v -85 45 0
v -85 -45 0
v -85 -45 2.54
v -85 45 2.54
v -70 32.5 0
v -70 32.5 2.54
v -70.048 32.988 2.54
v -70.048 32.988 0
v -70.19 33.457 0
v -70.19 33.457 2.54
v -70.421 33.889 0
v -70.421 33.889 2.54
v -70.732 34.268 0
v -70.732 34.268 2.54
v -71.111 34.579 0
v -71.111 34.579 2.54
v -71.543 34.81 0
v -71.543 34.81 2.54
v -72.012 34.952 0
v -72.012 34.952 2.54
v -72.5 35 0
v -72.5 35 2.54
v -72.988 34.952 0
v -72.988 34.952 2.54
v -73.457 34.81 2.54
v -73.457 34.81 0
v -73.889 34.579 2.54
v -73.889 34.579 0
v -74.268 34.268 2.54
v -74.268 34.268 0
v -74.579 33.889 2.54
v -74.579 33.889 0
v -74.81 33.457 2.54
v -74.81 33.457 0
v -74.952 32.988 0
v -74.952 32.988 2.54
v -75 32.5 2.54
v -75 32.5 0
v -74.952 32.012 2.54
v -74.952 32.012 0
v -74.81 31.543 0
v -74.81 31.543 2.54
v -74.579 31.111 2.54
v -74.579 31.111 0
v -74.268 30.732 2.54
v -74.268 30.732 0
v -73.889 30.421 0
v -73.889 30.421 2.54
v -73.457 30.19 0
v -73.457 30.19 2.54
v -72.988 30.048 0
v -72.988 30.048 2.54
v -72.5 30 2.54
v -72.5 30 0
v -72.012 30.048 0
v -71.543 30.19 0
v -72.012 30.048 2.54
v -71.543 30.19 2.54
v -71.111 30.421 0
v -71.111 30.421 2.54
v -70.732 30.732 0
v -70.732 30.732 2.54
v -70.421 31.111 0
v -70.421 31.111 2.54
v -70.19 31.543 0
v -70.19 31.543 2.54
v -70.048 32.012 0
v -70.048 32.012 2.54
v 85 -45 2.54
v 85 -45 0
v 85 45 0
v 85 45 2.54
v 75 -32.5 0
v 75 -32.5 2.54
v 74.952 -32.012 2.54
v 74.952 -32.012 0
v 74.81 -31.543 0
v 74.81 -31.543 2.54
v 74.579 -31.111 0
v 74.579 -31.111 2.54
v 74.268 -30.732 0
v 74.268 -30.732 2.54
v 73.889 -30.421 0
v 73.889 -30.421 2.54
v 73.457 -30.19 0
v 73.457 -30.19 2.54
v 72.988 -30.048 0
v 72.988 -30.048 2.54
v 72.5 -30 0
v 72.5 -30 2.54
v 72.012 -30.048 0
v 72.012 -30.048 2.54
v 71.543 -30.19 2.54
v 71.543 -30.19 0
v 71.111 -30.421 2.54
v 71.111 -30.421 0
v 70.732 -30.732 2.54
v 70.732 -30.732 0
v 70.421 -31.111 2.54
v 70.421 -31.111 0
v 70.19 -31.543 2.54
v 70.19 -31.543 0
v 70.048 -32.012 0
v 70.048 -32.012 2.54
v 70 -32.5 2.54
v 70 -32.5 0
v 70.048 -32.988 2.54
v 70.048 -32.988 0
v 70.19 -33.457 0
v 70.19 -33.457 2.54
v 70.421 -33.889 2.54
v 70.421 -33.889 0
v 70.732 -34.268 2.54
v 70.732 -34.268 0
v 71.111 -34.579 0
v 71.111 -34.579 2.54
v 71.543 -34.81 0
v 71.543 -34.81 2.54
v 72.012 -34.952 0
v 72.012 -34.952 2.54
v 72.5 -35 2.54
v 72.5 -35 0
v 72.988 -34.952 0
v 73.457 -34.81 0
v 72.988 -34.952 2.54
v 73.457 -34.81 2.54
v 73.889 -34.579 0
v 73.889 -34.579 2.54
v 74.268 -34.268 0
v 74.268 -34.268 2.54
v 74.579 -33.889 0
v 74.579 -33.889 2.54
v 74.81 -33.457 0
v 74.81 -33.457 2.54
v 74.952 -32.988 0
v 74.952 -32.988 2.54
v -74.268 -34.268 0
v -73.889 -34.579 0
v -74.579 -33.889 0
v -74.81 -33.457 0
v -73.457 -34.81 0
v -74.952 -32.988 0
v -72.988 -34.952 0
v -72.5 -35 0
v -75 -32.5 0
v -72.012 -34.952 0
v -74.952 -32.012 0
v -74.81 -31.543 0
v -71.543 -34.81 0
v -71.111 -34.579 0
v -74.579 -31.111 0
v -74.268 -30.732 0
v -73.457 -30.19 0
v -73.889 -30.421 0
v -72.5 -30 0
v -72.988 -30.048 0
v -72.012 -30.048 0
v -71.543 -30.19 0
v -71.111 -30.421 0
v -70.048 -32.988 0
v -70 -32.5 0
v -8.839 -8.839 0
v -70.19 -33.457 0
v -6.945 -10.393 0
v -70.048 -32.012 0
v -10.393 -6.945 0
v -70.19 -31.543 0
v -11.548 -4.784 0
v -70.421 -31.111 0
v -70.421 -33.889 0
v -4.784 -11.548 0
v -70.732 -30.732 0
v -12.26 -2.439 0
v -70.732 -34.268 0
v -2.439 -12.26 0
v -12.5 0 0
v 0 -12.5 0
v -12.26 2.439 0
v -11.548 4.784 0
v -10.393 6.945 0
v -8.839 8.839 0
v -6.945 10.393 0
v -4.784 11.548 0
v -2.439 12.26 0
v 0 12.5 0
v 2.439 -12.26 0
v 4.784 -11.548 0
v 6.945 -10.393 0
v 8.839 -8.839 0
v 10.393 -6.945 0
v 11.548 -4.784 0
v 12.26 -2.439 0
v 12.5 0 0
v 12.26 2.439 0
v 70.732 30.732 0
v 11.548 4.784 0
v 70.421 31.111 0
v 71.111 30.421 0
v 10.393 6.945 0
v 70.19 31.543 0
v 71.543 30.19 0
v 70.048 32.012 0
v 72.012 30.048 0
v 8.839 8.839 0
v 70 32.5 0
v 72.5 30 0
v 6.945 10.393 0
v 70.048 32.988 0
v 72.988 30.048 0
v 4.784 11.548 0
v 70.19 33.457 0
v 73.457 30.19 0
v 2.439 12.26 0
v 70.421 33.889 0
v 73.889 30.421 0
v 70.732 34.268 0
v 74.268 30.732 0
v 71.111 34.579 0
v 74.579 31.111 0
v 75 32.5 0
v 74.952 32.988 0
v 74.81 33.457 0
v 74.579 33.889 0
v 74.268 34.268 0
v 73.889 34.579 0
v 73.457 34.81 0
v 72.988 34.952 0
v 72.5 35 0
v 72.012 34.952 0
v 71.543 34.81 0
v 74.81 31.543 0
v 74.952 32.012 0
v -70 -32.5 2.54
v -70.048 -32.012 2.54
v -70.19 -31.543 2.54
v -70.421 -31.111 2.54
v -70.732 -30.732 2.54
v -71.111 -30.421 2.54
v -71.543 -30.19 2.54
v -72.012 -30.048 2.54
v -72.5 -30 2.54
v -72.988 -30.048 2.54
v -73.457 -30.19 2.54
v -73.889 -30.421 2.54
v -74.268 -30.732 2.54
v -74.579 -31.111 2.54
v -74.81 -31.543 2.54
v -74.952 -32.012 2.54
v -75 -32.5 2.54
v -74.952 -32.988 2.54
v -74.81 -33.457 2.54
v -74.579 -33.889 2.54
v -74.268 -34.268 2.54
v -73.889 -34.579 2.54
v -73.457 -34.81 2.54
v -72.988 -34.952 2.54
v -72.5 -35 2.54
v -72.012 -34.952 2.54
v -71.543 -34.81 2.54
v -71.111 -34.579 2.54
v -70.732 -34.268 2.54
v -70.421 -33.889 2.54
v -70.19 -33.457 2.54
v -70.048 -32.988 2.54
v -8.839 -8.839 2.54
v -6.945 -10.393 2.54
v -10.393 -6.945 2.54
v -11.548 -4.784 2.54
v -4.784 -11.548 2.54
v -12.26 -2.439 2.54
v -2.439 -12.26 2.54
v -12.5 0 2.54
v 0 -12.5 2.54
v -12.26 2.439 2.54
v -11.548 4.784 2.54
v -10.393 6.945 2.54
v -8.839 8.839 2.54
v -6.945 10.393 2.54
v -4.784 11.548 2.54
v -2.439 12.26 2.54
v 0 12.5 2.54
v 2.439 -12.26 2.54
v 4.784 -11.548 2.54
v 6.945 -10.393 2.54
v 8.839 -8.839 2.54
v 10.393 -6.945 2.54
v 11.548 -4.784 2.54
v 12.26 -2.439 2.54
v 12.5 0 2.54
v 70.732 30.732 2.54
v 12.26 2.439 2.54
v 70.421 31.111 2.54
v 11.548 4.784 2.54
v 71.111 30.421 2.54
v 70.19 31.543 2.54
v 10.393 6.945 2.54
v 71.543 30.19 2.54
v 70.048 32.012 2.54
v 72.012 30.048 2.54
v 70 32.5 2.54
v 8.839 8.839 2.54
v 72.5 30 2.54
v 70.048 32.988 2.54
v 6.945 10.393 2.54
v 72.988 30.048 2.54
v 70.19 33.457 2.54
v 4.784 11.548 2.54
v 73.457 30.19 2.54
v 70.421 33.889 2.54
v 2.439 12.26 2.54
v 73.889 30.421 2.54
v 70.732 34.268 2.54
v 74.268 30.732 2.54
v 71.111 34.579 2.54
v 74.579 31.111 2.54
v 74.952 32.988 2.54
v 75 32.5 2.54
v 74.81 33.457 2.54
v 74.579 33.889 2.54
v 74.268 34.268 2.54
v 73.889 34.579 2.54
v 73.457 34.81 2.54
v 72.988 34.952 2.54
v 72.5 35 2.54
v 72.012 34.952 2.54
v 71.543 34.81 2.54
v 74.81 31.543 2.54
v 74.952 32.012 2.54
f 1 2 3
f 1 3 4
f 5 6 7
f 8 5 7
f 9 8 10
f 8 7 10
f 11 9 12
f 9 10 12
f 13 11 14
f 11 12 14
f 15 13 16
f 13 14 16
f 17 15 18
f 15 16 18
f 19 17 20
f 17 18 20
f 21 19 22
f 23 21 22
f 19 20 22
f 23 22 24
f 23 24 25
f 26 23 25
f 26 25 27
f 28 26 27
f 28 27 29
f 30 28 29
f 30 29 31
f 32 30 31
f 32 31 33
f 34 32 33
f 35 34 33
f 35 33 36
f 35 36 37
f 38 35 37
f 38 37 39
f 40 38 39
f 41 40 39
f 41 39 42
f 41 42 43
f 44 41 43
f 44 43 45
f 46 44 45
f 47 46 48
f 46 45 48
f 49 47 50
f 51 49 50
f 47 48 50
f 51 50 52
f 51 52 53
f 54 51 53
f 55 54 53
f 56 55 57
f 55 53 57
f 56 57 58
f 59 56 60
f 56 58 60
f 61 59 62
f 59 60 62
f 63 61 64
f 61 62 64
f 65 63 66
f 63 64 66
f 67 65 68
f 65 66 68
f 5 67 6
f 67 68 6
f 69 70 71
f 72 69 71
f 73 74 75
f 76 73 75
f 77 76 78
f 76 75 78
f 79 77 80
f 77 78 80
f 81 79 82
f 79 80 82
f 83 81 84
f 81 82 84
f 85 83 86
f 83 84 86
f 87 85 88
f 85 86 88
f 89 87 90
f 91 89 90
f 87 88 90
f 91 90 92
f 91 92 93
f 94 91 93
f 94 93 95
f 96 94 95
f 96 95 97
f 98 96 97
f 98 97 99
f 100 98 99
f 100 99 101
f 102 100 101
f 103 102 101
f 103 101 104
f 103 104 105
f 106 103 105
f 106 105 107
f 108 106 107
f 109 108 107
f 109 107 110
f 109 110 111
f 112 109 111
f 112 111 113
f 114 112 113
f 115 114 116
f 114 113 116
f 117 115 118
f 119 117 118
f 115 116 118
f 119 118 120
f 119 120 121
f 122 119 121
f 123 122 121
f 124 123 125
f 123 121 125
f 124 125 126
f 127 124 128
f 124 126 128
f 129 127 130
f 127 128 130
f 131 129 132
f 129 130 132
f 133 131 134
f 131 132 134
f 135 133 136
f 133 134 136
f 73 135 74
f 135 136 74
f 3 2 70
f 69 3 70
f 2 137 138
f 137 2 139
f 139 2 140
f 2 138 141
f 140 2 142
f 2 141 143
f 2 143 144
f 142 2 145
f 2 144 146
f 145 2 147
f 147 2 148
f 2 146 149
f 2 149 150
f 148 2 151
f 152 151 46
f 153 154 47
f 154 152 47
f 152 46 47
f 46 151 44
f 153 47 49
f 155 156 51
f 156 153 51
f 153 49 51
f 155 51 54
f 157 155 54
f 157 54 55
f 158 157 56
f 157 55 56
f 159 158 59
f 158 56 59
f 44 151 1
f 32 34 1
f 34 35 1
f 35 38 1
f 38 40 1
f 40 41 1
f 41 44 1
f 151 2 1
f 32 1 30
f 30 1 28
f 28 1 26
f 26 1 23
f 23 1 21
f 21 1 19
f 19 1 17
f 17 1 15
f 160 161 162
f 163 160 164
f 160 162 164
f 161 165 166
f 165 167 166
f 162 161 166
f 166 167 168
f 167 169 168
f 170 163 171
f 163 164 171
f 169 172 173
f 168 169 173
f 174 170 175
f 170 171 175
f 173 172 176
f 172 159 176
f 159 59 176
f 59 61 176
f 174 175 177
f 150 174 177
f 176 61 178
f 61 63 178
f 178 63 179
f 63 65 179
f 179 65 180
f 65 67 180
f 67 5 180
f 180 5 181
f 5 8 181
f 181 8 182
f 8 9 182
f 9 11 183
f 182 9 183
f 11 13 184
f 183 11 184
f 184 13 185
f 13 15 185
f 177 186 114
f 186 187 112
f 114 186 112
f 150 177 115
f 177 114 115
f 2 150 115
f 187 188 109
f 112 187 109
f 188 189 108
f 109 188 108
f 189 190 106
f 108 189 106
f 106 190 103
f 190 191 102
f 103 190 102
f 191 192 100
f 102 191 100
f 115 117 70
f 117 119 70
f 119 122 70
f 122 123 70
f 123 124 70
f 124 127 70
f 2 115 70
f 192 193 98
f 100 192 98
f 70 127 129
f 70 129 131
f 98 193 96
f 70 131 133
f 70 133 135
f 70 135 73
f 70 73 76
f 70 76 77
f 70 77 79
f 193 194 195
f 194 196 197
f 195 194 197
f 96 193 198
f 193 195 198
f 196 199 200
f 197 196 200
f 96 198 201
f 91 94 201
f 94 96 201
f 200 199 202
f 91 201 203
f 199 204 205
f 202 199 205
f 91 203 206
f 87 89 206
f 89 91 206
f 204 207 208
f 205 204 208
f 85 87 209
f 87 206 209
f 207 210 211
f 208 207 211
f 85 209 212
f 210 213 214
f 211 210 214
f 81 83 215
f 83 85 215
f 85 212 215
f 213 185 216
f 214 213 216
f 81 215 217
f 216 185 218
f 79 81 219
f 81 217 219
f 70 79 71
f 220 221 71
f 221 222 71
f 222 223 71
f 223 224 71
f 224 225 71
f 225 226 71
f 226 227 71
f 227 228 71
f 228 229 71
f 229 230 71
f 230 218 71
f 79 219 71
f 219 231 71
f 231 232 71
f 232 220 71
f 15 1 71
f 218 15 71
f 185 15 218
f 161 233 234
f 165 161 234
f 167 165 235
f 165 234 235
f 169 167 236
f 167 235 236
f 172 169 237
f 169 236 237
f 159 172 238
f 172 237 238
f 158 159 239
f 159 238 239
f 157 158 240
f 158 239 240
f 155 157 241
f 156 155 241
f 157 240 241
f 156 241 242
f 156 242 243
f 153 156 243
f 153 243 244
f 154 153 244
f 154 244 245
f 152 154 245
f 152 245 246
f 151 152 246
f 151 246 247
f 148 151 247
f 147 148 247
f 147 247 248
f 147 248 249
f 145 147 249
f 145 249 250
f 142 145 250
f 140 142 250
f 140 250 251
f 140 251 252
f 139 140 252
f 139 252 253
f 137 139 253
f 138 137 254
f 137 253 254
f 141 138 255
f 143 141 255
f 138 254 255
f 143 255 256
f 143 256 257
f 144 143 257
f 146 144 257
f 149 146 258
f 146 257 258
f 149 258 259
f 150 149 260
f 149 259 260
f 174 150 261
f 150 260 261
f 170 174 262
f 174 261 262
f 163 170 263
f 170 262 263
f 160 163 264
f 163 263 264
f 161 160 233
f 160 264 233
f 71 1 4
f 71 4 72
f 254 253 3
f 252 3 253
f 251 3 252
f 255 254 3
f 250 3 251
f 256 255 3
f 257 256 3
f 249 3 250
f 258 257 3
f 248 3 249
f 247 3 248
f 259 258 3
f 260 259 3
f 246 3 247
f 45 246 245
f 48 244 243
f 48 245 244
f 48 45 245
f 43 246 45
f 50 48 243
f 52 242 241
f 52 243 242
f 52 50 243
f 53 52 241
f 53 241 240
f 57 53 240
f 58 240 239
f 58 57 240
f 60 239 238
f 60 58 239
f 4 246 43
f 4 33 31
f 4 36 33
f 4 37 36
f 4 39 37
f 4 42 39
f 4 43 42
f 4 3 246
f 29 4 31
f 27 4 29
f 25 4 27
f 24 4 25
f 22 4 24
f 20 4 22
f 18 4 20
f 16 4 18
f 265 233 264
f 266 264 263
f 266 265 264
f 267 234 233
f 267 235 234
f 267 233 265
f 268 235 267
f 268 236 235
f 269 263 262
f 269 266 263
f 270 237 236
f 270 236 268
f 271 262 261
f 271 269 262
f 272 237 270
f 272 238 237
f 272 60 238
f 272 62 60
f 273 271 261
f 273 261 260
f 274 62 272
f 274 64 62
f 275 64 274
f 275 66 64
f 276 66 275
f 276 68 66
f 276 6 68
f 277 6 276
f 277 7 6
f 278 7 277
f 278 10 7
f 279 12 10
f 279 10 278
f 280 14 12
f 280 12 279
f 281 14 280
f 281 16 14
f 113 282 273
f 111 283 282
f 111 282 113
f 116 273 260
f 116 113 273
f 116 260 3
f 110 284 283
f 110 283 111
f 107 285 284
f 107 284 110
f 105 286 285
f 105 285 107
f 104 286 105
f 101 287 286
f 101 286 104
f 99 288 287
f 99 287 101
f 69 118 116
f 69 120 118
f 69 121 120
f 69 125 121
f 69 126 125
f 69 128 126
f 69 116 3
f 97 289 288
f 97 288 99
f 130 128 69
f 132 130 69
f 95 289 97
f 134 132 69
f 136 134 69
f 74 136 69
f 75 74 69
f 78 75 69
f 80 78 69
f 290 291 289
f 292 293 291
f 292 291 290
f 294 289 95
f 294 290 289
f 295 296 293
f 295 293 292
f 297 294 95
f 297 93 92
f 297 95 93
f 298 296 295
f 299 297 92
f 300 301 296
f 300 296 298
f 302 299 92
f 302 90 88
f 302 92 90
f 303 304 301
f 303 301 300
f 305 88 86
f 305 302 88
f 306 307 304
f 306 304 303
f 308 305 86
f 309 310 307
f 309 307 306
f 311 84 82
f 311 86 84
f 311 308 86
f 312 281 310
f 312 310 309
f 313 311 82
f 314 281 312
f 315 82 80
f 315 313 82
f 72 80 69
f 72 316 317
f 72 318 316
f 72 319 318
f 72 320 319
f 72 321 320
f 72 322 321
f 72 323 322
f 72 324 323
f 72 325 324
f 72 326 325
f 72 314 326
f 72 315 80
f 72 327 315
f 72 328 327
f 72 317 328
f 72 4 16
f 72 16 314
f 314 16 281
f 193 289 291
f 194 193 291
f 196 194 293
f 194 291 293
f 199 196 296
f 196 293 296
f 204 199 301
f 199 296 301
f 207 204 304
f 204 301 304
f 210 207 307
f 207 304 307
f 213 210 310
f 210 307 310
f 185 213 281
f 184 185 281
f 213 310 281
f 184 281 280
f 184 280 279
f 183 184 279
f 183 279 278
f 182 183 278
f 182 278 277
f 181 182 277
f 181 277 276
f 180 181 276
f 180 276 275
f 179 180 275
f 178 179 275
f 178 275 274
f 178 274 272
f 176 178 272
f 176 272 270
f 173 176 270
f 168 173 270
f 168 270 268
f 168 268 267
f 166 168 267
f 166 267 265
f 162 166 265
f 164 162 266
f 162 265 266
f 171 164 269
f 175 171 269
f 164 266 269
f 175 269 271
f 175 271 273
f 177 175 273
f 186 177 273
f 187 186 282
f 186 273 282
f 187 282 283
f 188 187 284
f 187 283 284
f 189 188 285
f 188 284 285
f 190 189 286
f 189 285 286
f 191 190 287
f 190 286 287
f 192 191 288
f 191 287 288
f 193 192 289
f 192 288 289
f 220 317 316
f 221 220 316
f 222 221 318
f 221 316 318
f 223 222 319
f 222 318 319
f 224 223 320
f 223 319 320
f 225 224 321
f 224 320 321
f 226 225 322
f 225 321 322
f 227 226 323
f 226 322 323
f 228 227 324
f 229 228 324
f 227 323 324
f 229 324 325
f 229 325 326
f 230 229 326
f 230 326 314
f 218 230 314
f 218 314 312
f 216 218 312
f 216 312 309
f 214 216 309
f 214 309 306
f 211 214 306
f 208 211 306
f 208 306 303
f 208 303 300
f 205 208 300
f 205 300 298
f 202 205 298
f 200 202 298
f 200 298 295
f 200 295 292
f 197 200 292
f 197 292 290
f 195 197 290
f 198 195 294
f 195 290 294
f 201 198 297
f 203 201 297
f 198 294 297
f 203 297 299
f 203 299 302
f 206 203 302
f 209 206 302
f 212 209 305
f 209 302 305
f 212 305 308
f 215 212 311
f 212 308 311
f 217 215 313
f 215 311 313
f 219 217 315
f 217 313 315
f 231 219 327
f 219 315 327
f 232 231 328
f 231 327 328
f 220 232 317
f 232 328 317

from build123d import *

# Parameters (mm, degrees)
F0_W     = 170
F0_H     = 90
F1_DEPTH = 2.54
F2_R     = 12.5
F3_DEPTH = 2.541
F4_R     = 2.5
F5_DEPTH = 2.541


with BuildPart() as f1:
    # F0 (on Top) → F1 (new body)
    with BuildSketch(Plane.XY):
        Rectangle(F0_W, F0_H)
    extrude(amount=F1_DEPTH)

    # F2 (on face) → F3 (cut, through all)
    with BuildSketch(Plane.XY.offset(2.54)):
        Circle(F2_R)
    extrude(amount=-F3_DEPTH, mode=Mode.SUBTRACT)

    # F4 (on face) → F5 (cut, through all)
    with BuildSketch(Plane.XY.offset(2.54)):
        with Locations((-72.5, 32.5)):
            Circle(F4_R)
        with Locations((72.5, 32.5)):
            Circle(F4_R)
        with Locations((72.5, -32.5)):
            Circle(F4_R)
        with Locations((-72.5, -32.5)):
            Circle(F4_R)
    extrude(amount=-F5_DEPTH, mode=Mode.SUBTRACT)


solid = f1.part
